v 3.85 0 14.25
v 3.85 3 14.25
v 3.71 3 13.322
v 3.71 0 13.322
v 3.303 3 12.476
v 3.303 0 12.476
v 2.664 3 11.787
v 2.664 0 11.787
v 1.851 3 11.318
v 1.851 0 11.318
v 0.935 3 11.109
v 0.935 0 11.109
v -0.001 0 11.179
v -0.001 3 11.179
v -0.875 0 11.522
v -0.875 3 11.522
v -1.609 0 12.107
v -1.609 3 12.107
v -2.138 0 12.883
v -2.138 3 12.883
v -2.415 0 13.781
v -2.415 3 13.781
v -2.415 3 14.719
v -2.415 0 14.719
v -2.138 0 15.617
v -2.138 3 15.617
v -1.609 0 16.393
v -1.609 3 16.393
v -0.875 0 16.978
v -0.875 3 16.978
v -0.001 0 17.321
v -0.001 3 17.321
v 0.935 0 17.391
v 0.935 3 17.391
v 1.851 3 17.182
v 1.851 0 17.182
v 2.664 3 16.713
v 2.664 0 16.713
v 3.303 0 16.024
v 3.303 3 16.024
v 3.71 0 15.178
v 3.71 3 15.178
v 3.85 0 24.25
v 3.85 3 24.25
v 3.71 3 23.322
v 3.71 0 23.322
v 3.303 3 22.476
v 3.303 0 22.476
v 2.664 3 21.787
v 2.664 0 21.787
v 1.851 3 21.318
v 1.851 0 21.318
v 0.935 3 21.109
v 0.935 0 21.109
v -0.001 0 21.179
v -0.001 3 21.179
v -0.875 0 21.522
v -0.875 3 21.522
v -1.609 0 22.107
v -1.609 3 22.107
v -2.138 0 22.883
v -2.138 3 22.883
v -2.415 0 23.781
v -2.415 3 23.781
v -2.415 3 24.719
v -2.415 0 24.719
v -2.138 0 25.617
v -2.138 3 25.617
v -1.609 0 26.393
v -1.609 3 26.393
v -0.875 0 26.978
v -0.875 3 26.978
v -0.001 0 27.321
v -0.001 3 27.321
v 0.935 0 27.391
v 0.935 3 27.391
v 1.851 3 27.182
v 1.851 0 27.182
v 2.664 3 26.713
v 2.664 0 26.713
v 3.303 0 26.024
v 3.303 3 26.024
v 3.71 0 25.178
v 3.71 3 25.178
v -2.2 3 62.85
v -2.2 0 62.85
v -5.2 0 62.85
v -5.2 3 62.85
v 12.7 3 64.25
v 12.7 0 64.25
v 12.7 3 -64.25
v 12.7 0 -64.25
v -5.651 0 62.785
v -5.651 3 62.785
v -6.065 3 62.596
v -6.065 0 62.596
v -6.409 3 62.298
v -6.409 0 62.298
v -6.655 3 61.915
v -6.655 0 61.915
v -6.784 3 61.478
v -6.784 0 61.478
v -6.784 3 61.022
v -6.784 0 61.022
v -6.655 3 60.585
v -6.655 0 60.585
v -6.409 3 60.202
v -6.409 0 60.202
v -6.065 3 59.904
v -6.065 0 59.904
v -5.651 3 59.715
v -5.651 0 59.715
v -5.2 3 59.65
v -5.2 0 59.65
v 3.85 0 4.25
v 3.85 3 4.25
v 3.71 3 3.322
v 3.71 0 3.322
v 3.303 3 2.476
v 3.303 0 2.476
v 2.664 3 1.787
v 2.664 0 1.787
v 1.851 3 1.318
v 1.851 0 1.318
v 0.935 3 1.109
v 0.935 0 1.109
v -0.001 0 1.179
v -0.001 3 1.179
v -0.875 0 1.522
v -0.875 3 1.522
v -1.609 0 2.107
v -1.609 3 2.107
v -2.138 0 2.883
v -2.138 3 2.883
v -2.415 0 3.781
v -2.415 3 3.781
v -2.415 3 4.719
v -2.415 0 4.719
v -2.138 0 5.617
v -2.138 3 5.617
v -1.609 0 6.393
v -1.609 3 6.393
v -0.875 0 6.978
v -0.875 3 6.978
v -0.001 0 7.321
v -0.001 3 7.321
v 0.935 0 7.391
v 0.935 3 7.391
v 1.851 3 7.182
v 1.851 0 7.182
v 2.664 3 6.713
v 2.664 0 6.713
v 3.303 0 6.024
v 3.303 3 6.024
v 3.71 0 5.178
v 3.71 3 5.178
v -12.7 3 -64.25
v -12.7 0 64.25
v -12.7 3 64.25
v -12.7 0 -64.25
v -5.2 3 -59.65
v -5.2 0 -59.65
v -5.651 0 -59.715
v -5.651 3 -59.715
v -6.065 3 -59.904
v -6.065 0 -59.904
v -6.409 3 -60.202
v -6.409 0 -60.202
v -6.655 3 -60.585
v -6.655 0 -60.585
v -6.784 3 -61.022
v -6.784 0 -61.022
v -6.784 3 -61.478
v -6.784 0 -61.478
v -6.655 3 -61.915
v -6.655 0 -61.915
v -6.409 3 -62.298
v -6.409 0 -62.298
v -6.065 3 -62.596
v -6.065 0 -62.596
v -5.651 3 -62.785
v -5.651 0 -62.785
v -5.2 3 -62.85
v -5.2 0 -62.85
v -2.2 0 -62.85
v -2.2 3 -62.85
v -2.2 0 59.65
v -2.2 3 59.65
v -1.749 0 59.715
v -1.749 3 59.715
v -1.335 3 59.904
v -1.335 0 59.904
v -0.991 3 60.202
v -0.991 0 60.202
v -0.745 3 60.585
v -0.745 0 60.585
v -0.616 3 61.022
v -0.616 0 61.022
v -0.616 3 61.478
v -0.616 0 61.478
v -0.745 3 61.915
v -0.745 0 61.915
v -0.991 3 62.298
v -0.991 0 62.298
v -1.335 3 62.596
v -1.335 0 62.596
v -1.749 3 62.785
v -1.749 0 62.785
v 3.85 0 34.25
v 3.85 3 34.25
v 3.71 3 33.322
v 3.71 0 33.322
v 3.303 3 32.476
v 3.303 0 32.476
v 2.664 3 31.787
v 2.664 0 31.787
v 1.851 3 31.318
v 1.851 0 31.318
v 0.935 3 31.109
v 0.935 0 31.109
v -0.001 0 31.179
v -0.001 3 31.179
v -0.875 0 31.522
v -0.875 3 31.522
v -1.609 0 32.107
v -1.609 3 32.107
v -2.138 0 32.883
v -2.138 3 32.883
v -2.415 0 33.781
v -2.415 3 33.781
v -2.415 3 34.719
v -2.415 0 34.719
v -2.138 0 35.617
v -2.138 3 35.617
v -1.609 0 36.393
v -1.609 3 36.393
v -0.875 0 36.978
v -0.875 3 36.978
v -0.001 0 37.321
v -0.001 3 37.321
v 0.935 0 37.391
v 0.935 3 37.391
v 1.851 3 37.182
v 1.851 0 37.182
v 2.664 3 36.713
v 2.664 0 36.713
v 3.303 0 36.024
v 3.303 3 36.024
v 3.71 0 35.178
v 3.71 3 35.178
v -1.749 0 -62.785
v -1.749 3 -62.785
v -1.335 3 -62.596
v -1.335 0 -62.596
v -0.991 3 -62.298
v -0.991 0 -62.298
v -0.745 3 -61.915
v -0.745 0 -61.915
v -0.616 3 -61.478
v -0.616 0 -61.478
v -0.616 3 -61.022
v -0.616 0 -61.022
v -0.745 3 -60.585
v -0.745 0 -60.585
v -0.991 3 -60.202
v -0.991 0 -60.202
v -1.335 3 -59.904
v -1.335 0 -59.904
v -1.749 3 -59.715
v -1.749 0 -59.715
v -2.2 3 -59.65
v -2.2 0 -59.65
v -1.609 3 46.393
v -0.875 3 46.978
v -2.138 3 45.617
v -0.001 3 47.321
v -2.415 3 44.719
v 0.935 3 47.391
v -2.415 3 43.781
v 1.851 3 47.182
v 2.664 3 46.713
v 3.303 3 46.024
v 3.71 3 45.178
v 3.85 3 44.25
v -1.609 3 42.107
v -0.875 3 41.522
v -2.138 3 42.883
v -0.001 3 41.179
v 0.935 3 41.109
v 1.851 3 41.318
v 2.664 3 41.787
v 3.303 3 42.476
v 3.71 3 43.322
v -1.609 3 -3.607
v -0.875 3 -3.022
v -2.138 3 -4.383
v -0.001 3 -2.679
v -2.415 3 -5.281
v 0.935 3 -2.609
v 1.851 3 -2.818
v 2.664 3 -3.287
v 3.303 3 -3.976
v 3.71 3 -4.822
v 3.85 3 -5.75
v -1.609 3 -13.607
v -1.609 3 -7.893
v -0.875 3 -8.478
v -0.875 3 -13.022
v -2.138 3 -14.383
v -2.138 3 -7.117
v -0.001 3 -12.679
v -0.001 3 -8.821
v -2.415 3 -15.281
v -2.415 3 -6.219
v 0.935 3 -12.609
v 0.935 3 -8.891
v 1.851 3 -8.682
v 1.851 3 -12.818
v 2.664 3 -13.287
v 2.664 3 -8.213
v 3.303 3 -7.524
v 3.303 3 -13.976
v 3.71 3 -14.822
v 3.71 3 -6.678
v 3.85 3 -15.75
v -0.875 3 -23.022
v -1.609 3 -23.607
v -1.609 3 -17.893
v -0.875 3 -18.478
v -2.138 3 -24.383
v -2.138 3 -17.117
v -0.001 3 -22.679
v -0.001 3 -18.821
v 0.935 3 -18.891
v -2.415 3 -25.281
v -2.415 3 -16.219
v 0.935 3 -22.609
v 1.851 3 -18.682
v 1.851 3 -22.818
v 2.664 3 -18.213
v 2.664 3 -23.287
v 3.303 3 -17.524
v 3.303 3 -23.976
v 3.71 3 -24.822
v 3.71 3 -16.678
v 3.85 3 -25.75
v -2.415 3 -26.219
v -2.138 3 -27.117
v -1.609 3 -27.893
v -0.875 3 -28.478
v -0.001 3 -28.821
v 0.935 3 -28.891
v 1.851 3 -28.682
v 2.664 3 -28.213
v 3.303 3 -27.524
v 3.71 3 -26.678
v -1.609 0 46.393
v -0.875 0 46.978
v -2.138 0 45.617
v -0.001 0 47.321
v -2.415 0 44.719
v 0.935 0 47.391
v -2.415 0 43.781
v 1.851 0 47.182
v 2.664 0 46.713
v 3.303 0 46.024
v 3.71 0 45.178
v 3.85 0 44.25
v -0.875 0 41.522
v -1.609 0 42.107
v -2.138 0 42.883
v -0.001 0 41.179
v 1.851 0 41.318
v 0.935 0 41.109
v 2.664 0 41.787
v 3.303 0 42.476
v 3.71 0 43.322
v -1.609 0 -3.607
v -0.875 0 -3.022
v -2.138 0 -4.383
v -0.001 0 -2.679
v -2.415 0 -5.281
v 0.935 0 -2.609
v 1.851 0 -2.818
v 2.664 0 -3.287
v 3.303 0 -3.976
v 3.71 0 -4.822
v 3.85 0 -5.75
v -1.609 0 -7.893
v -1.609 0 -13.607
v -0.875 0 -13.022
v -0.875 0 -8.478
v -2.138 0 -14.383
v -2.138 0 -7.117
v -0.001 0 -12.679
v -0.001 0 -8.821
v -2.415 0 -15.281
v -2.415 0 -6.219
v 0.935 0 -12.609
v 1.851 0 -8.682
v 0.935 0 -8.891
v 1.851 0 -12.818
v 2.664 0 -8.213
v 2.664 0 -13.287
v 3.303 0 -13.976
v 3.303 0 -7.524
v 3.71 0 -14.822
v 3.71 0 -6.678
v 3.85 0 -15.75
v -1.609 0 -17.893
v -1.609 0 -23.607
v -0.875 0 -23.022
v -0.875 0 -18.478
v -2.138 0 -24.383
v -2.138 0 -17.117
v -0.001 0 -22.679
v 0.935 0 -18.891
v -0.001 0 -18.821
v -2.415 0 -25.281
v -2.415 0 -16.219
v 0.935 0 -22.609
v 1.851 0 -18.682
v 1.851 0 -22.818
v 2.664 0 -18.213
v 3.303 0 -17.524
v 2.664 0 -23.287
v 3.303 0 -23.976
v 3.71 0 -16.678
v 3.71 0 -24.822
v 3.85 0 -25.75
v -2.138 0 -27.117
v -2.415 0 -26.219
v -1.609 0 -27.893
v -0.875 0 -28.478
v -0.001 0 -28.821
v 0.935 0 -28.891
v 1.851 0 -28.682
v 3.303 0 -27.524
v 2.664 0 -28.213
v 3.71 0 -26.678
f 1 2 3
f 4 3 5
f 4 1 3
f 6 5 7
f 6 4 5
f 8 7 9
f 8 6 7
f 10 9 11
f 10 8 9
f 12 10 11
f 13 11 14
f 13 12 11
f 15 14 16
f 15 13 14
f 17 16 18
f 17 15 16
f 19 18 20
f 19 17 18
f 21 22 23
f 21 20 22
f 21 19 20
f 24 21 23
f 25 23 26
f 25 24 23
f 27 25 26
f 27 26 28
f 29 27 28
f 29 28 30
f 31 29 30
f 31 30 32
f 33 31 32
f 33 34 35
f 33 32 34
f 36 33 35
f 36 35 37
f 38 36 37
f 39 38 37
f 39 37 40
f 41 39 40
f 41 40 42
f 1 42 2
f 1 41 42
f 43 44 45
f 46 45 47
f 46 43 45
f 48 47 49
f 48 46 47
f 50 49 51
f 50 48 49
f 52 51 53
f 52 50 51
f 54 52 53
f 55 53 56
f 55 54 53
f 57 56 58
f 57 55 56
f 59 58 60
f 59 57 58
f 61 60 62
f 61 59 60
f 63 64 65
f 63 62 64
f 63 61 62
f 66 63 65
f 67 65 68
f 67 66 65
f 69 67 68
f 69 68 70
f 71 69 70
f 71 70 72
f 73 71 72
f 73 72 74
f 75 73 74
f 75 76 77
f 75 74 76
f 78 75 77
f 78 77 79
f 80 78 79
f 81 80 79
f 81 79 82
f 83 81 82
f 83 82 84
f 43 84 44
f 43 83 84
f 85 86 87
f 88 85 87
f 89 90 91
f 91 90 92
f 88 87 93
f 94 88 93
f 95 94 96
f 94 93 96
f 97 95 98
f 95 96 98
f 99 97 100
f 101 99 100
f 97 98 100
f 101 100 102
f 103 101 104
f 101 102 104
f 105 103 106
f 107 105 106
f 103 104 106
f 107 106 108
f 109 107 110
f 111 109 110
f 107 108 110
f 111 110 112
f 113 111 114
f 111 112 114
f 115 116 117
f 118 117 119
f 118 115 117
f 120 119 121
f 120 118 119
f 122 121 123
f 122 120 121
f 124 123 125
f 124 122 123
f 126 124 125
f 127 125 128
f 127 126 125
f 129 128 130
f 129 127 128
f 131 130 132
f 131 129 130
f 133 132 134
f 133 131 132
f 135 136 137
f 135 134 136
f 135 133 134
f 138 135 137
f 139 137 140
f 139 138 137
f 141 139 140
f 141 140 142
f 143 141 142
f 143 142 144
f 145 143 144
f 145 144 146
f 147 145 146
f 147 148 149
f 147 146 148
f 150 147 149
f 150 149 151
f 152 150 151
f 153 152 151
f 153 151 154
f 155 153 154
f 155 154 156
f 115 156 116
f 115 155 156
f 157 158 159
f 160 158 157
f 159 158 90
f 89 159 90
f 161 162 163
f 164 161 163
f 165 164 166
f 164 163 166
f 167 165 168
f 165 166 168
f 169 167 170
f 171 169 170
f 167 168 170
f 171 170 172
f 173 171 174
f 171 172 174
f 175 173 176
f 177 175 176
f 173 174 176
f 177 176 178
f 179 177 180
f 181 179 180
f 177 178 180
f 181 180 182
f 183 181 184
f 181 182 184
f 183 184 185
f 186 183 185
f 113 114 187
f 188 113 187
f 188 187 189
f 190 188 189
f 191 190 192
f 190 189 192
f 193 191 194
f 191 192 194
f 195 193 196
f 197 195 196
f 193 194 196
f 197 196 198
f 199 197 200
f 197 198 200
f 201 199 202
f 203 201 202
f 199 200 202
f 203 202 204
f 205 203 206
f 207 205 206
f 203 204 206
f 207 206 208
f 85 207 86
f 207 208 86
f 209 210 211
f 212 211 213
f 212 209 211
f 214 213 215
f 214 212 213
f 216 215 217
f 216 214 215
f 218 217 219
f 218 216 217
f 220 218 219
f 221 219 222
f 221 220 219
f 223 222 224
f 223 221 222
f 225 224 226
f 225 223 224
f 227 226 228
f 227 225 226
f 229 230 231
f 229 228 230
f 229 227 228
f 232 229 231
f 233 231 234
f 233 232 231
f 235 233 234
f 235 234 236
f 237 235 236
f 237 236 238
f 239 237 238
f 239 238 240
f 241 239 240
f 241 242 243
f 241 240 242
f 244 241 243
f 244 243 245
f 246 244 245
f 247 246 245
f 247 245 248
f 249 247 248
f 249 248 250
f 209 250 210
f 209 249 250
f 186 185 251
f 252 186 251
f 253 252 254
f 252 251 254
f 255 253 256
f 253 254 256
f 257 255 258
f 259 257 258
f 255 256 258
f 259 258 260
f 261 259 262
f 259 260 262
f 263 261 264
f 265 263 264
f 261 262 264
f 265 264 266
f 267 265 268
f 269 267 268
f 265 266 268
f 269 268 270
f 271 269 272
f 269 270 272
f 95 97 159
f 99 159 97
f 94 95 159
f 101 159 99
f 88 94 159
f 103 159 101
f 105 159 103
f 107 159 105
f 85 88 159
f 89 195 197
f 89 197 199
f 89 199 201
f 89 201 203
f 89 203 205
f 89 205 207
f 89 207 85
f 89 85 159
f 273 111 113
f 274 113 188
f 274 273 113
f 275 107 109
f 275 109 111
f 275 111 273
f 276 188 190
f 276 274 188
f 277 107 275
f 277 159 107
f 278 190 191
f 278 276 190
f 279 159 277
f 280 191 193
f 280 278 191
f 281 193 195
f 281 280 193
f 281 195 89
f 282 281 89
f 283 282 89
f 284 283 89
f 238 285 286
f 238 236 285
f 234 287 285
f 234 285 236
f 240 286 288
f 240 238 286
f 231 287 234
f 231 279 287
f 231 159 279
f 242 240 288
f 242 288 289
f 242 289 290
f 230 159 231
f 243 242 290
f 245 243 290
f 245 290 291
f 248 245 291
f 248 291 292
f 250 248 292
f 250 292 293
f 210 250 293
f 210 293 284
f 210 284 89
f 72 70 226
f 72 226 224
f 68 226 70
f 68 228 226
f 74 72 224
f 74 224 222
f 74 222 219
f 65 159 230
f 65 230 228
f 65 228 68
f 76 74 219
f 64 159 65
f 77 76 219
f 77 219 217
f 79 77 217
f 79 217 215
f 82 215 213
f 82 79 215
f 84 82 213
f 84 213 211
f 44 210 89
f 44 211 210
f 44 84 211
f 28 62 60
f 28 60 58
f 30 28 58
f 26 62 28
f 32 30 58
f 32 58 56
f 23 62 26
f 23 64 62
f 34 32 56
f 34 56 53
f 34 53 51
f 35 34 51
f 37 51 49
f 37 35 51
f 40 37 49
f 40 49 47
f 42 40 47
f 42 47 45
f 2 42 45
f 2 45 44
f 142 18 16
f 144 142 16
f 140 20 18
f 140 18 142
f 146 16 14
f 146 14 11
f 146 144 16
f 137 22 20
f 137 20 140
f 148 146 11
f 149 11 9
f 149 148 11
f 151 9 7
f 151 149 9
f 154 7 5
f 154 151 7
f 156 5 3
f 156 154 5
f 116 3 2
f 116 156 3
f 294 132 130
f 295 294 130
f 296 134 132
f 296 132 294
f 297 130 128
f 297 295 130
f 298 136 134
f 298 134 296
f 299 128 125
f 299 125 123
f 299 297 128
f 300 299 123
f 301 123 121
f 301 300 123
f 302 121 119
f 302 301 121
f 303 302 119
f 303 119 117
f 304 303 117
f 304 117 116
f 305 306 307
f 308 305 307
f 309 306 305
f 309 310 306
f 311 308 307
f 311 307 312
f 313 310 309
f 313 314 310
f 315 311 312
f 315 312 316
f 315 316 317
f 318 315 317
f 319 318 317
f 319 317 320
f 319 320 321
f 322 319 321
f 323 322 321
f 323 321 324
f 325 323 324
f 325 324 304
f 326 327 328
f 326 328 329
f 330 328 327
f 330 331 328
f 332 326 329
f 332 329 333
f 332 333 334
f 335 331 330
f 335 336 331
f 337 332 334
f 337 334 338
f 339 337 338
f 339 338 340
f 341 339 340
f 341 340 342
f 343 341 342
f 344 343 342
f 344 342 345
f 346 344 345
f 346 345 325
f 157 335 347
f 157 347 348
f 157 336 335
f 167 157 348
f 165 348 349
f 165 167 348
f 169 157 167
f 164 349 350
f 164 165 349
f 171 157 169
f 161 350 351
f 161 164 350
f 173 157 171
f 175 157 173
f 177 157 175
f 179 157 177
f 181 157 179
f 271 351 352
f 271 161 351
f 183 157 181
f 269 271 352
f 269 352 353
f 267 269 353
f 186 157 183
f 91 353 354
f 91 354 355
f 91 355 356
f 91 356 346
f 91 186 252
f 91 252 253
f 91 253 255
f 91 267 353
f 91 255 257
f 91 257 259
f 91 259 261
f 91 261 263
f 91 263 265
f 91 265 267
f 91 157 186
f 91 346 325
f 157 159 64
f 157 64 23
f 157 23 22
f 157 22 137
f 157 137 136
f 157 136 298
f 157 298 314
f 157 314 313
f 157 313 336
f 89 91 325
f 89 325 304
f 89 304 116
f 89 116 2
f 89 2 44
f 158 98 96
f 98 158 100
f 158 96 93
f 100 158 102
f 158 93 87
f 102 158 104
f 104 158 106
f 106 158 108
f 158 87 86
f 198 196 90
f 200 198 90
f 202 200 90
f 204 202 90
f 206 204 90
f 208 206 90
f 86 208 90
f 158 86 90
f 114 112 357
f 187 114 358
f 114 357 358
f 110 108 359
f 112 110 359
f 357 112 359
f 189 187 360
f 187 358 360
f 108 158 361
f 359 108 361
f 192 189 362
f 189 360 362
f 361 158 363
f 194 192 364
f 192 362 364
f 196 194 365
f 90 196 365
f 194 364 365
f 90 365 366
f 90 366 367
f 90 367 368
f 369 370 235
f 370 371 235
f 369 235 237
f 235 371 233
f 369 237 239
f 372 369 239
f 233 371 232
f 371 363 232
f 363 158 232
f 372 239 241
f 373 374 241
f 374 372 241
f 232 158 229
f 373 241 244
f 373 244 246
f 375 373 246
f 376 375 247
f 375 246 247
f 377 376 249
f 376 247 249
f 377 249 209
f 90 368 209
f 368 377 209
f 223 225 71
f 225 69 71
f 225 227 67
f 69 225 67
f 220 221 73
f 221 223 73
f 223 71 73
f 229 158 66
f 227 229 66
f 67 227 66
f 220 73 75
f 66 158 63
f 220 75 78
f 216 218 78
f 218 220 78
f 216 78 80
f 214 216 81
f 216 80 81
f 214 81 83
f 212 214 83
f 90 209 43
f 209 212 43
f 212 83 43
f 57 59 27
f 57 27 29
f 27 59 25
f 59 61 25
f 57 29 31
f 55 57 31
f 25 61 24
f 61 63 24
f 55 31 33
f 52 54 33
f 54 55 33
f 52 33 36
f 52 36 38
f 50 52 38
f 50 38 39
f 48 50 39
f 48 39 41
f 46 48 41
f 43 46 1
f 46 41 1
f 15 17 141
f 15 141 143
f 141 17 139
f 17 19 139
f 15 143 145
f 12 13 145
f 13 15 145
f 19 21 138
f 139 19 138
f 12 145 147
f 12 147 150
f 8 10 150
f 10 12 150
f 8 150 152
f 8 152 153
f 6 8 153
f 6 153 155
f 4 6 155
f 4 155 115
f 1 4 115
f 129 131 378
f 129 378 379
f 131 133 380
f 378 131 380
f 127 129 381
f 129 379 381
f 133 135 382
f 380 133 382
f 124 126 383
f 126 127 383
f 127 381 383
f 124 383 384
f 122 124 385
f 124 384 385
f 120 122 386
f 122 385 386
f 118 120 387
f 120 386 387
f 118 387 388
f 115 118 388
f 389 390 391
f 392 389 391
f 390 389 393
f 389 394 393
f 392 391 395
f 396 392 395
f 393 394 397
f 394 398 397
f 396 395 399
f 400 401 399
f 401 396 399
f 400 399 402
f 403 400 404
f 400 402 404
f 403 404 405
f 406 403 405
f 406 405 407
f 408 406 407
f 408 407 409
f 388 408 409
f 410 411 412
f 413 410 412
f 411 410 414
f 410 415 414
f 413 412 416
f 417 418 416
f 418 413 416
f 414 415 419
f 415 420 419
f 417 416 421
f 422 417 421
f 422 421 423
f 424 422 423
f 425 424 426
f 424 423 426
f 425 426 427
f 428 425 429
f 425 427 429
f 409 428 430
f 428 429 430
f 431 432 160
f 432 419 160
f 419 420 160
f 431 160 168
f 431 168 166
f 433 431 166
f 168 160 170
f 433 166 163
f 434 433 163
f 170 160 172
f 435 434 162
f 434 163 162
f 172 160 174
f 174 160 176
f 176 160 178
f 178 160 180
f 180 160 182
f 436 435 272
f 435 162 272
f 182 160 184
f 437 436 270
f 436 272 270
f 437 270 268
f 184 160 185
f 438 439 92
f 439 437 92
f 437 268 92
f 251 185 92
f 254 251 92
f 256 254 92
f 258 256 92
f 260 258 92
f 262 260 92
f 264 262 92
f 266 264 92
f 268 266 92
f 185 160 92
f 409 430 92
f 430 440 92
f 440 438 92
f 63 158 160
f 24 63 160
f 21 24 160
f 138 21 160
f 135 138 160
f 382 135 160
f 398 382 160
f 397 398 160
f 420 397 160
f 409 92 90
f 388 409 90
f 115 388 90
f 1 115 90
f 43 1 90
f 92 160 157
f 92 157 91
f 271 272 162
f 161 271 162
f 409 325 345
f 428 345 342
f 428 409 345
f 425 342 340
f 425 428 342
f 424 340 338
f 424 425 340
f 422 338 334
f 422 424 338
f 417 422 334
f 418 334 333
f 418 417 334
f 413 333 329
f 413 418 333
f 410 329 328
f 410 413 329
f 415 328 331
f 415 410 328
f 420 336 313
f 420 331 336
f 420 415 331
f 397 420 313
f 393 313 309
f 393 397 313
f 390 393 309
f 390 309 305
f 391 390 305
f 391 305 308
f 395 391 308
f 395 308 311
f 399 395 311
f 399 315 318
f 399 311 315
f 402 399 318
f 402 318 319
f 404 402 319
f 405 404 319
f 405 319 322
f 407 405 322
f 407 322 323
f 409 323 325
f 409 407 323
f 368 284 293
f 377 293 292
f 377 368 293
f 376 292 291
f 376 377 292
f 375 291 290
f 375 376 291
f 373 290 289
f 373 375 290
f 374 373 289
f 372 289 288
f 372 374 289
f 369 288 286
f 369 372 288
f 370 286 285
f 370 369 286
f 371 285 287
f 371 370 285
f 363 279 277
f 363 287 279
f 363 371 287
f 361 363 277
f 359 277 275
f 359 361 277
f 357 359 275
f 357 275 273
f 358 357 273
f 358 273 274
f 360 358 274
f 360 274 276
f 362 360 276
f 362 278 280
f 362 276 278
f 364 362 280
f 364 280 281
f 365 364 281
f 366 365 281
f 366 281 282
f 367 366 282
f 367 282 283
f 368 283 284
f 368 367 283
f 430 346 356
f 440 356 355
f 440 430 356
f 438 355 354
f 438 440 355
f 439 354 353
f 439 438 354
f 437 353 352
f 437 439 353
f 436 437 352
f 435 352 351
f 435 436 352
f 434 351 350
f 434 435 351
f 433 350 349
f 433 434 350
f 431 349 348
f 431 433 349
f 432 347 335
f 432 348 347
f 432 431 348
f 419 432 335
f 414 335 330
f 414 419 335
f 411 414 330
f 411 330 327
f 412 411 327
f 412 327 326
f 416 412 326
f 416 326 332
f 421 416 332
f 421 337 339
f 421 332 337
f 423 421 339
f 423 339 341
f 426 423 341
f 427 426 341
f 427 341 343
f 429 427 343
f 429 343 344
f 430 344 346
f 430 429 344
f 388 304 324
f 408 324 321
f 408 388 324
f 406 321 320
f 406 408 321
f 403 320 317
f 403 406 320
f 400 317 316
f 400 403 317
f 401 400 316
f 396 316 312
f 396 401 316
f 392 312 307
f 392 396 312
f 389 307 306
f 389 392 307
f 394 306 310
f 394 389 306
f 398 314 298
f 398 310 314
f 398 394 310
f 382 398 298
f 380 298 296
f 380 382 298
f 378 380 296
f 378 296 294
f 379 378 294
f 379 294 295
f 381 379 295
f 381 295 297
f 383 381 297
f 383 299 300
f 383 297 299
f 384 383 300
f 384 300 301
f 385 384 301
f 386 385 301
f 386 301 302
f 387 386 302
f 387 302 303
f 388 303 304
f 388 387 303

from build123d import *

# Parameters (mm, degrees)
SKIZZE1_W                       = 25.4
SKIZZE1_H                       = 128.5
AUFSATZ_LINEAR_AUSTRAGEN1_DEPTH = 3
SCHNITT_LINEAR_AUSTRAGEN4_DEPTH = 4
SKIZZE3_R                       = 3.15
SCHNITT_LINEAR_AUSTRAGEN6_DEPTH = 4


with BuildPart() as part:
    # Skizze1 → Aufsatz-Linear austragen1 (new body)
    with BuildSketch(Plane(origin=(0, 0, 0), x_dir=(1, 0, 0), z_dir=(0, 1, 0))):
        Rectangle(SKIZZE1_W, SKIZZE1_H)
    extrude(amount=AUFSATZ_LINEAR_AUSTRAGEN1_DEPTH)

    # Skizze2 → Schnitt-Linear austragen4 (cut, through all)
    with BuildSketch(Plane(origin=(0, 0, 0), x_dir=(1, 0, 0), z_dir=(0, 1, 0))):
        with BuildLine():
            Line((-5.2, 62.85), (-2.2, 62.85))
            ThreePointArc((-2.2, 62.85), (-0.6, 61.25), (-2.2, 59.65))
            Line((-2.2, 59.65), (-5.2, 59.65))
            ThreePointArc((-5.2, 59.65), (-6.8, 61.25), (-5.2, 62.85))
        make_face()
        with BuildLine():
            Line((-5.2, -59.65), (-2.2, -59.65))
            ThreePointArc((-2.2, -59.65), (-0.6, -61.25), (-2.2, -62.85))
            Line((-2.2, -62.85), (-5.2, -62.85))
            ThreePointArc((-5.2, -62.85), (-6.8, -61.25), (-5.2, -59.65))
        make_face()
    extrude(amount=SCHNITT_LINEAR_AUSTRAGEN4_DEPTH, mode=Mode.SUBTRACT)

    # Skizze3 → Schnitt-Linear austragen6 (cut, through all)
    with BuildSketch(Plane(origin=(0, 0, 0), x_dir=(1, 0, 0), z_dir=(0, 1, 0))):
        with Locations((0.7, -44.25)):
            Circle(SKIZZE3_R)
        with Locations((0.7, -34.25)):
            Circle(SKIZZE3_R)
        with Locations((0.7, -24.25)):
            Circle(SKIZZE3_R)
        with Locations((0.7, -14.25)):
            Circle(SKIZZE3_R)
        with Locations((0.7, -4.25)):
            Circle(SKIZZE3_R)
        with Locations((0.7, 5.75)):
            Circle(SKIZZE3_R)
        with Locations((0.7, 15.75)):
            Circle(SKIZZE3_R)
        with Locations((0.7, 25.75)):
            Circle(SKIZZE3_R)
    extrude(amount=SCHNITT_LINEAR_AUSTRAGEN6_DEPTH, mode=Mode.SUBTRACT)


solid = part.part
